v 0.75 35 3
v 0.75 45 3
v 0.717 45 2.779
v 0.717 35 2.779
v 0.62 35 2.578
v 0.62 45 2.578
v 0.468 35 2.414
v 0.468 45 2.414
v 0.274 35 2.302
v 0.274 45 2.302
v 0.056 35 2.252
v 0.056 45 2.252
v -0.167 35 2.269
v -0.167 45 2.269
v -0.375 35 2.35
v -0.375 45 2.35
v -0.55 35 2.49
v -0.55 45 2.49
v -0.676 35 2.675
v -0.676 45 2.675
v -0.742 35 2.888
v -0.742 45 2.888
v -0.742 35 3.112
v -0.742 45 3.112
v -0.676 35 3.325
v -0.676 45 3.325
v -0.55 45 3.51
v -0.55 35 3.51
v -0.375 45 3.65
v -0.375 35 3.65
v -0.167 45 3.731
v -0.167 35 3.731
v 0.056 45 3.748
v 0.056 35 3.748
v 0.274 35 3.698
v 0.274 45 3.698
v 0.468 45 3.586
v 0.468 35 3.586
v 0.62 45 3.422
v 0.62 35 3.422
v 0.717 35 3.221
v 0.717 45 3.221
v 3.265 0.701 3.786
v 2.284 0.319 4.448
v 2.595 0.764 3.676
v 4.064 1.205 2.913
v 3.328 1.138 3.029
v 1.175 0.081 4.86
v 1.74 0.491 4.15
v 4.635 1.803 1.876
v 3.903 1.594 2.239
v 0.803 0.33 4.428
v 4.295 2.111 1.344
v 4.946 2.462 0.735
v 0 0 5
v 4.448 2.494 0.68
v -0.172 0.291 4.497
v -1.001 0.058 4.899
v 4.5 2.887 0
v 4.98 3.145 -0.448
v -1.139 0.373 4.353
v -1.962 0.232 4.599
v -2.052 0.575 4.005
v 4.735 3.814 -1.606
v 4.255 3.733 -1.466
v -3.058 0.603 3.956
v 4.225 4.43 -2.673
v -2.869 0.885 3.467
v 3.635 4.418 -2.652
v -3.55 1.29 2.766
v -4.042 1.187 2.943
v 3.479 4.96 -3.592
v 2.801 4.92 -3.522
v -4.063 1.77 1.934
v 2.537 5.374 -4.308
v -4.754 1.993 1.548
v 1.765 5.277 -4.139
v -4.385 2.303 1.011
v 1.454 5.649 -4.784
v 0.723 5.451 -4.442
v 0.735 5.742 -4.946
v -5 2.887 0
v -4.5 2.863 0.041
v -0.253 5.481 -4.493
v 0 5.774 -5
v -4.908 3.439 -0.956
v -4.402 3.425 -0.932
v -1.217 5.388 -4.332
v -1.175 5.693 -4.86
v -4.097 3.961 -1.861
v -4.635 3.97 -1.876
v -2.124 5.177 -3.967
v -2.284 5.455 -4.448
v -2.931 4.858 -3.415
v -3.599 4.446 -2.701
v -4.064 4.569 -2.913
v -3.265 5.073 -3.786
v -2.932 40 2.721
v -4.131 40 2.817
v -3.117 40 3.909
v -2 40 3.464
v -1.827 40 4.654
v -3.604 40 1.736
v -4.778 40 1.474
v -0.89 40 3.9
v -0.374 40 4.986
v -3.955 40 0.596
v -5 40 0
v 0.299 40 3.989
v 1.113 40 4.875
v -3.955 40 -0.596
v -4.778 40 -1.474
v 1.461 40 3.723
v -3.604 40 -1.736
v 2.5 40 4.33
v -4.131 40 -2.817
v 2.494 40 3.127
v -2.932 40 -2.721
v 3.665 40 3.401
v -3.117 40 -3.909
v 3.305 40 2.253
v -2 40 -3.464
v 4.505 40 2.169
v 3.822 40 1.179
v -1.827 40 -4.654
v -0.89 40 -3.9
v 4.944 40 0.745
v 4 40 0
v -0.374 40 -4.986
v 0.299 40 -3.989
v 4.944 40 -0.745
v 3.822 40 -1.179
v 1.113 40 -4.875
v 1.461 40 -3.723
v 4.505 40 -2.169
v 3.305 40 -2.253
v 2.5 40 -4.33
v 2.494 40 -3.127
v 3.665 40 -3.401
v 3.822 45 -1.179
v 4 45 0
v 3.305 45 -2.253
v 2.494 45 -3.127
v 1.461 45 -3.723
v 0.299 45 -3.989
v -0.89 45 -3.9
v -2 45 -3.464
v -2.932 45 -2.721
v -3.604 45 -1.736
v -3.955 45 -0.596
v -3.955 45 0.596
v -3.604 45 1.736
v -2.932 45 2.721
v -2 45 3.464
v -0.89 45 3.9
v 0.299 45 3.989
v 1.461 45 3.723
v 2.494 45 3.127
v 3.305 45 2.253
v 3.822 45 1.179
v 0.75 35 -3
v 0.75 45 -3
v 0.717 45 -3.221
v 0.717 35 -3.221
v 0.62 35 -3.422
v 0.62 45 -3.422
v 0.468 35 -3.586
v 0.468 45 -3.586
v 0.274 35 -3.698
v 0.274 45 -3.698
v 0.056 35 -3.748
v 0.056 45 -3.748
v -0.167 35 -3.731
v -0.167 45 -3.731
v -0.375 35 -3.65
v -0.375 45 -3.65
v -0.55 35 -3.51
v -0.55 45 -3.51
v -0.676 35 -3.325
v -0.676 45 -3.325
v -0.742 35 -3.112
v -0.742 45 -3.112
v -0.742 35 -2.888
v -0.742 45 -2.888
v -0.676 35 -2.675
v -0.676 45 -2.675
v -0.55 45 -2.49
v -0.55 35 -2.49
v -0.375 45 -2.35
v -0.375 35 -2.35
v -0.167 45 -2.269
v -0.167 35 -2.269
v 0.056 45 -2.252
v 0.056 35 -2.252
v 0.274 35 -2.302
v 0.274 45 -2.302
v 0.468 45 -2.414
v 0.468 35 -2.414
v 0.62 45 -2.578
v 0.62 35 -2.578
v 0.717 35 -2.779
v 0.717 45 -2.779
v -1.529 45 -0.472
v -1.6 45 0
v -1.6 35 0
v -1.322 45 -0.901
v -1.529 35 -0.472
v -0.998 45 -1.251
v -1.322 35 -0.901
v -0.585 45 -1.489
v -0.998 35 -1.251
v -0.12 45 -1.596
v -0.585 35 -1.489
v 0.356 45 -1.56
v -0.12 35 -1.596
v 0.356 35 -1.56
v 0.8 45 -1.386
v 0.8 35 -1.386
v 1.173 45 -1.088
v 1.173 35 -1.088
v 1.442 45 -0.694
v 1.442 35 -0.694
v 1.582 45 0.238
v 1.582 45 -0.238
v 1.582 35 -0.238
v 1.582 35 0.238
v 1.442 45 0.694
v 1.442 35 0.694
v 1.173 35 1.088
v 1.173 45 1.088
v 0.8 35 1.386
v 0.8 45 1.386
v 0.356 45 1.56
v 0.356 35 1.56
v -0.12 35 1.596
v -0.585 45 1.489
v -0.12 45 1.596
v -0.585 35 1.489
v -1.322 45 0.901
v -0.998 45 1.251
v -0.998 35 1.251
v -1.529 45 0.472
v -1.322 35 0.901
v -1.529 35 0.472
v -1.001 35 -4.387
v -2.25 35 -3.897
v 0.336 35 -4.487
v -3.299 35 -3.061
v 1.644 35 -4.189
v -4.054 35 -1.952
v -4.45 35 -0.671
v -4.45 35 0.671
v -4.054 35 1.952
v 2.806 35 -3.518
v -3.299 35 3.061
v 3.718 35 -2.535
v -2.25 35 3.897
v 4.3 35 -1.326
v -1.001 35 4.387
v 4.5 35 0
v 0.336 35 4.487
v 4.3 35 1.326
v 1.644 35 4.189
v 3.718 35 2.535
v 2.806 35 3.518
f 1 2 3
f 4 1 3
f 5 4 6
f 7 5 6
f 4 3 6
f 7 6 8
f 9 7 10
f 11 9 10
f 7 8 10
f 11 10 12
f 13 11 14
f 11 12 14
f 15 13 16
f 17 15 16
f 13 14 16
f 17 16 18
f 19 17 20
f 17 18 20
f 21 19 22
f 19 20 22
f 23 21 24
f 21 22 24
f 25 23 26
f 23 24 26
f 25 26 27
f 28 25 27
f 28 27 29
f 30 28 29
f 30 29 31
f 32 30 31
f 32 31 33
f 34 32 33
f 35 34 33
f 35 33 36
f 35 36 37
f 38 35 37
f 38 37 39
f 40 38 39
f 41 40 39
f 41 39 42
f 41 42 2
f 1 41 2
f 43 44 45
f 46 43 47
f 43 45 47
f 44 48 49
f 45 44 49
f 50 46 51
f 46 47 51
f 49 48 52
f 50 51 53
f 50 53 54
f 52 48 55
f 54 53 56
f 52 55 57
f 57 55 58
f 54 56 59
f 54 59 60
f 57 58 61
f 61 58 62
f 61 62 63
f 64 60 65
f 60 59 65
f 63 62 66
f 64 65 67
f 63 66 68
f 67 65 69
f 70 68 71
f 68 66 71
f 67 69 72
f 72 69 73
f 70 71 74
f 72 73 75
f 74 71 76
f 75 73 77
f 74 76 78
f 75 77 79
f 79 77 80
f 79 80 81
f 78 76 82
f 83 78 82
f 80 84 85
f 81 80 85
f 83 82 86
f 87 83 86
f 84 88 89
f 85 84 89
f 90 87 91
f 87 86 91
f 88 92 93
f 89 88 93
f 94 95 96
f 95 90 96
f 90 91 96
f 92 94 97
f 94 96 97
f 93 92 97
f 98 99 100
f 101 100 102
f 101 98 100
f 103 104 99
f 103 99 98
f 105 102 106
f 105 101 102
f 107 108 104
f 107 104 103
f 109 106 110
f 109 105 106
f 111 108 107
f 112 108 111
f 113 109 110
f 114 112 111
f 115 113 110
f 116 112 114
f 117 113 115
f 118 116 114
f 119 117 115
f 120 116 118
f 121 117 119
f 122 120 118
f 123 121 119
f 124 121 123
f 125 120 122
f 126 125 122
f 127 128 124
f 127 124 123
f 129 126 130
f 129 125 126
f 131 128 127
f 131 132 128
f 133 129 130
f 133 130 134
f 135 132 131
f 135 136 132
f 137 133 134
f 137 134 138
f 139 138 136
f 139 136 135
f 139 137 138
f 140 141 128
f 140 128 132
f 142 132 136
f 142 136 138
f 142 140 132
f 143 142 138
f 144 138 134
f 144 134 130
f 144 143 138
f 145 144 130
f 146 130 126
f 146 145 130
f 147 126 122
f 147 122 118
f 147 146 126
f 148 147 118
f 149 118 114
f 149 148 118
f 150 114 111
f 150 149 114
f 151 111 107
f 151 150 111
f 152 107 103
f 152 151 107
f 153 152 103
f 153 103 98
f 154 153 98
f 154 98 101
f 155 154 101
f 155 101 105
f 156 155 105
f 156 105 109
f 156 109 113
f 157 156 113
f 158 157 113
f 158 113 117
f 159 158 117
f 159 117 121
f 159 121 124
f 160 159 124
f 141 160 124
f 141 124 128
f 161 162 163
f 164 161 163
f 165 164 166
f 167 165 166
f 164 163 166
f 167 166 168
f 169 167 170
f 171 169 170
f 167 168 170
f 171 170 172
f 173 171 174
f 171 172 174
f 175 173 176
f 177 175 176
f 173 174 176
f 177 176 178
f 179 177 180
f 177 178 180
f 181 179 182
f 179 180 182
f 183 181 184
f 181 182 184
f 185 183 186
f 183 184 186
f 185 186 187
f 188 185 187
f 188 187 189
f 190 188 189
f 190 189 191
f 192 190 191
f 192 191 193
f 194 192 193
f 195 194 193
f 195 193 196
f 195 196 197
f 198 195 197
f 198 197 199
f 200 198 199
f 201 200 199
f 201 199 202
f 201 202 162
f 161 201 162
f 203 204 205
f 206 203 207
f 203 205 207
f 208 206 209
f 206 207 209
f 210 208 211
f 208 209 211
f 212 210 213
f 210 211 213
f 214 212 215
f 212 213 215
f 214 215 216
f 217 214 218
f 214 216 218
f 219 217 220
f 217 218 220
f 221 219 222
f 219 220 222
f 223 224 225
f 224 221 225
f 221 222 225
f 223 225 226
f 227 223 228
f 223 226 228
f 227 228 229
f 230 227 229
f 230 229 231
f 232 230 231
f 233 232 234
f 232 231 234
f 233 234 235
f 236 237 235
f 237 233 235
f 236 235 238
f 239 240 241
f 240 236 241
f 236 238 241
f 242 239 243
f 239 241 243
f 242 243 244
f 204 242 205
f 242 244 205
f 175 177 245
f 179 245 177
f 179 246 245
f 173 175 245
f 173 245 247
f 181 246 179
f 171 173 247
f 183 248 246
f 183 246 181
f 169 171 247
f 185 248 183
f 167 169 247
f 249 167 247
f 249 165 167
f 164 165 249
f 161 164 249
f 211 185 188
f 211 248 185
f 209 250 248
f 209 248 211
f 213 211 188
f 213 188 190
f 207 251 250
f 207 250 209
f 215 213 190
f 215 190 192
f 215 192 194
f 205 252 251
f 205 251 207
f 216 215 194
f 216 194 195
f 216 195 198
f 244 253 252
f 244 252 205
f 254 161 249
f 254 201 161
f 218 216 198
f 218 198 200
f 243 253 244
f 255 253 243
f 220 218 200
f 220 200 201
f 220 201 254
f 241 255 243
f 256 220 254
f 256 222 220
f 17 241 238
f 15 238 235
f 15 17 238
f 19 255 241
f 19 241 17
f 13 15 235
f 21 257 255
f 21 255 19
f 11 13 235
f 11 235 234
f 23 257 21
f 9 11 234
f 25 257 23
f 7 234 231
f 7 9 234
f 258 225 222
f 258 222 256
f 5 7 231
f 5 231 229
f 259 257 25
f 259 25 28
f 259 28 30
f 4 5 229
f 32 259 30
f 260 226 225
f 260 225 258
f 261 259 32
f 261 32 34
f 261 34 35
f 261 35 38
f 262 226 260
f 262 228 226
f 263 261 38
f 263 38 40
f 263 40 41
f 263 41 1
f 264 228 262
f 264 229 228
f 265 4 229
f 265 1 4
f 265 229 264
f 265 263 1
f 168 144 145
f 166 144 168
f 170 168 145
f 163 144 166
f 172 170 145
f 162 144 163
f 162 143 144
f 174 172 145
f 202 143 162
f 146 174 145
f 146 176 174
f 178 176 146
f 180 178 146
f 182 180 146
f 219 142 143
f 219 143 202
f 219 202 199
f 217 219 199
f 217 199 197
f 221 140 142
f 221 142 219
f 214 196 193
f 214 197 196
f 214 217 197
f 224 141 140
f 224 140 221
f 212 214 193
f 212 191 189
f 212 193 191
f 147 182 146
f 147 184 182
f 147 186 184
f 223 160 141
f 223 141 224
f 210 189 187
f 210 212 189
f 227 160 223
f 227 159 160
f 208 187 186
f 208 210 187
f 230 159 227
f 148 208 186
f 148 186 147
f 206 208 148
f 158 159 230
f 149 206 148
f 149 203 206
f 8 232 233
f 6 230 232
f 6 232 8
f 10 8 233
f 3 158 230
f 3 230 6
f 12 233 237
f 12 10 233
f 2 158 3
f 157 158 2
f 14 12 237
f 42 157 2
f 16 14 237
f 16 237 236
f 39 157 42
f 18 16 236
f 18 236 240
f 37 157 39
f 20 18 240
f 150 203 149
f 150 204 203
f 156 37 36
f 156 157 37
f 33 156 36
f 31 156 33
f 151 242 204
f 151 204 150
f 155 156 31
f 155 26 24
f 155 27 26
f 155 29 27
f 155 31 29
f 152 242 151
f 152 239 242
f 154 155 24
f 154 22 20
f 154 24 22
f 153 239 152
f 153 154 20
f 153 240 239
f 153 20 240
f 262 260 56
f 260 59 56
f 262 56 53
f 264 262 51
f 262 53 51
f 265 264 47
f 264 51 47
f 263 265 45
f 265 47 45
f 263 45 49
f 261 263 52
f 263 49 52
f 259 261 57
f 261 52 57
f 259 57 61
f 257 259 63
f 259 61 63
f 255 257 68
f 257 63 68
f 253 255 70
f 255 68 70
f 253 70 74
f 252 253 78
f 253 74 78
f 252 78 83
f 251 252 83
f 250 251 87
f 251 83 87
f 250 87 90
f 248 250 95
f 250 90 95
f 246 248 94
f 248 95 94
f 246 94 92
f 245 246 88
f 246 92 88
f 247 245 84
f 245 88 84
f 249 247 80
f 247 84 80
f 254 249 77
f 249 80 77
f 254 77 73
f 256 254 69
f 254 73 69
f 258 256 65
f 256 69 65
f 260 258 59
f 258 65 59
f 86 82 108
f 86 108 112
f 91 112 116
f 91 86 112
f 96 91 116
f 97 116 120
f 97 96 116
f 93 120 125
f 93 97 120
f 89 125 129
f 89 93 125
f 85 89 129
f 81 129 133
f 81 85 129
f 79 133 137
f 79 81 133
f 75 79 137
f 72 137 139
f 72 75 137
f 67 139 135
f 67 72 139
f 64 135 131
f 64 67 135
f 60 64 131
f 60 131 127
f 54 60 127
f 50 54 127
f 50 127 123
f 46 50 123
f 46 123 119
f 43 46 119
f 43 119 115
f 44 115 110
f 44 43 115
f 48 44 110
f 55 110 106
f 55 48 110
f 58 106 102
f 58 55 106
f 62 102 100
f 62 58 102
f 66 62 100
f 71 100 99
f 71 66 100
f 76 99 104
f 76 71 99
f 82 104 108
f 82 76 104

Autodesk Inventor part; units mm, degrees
ref_plane "YZ Plane" through (0, 0, 0) normal (1, 0, 0) x (0, 1, 0)
ref_plane "XZ Plane" through (0, 0, 0) normal (0, 1, 0) x (-1, 0, 0)
ref_plane "XY Plane" through (0, 0, 0) normal (0, 0, 1) x (1, 0, 0)
sketch "Sketch1" plane through (0, 0, 0) normal (0, 1, 0) x (-1, 0, 0)
  circle A0 centre (0, 0) radius 5
  circle A1 centre (0, 0) radius 1.6
  dimension "d0" = 10
  dimension "d1" = 3.2
extrude "Extrusion1" add sketch "Sketch1" along normal blind 45
sketch "Sketch2" plane through (0, 45, 0) normal (0, 1, 0) x (1, 0, 0)
  circle A0 centre (0, 3) radius 0.75
  circle A1 centre (0, -3) radius 0.75
  point P0 (0, 0)
  dimension "d4" = 1.5
  dimension "d5" = 1.5
  dimension "d6" = 6
  dimension "d7" = 3
  dimension "d8" = 0
  dimension "d10" = 0
extrude "Extrusion2" cut sketch "Sketch2" against normal through all
sketch "Sketch3" plane through (0, 0, 0) normal (0, -1, 0) x (1, 0, 0)
  circle A0 centre (0, 0) radius 4.5
  dimension "d13" = 9
extrude "Extrusion3" cut sketch "Sketch3" against normal blind 35
sketch "Sketch4" plane through (0, 0, 0) normal (1, 0, 0) x (0, 1, 0)
  line L0 (0, -5) -> (0, 5) projected
  line L1 (0, 5) -> (5.7735, -5)
  line L2 (0, -5) -> (45, -5) projected
  line L3 (0, 5) -> (11.547, 5) construction
  line L4 (5.7735, -5) -> (0, -5)
  line L5 (0, 5) -> (0, -5)
  point P0 (0, 0)
  dimension "d16" = 60
extrude "Extrusion4" cut sketch "Sketch4" along normal through all both and the other way through all
sketch "Sketch5" plane through (0, 45, 0) normal (0, 1, 0) x (1, 0, 0)
  circle A0 centre (0, 0) radius 5
  circle A1 centre (0, 0) radius 4
  dimension "d19" = 10
  dimension "d20" = 8
extrude "Extrusion5" cut sketch "Sketch5" against normal blind 5
properties part number "End-tip Coupler" material "Copper"
